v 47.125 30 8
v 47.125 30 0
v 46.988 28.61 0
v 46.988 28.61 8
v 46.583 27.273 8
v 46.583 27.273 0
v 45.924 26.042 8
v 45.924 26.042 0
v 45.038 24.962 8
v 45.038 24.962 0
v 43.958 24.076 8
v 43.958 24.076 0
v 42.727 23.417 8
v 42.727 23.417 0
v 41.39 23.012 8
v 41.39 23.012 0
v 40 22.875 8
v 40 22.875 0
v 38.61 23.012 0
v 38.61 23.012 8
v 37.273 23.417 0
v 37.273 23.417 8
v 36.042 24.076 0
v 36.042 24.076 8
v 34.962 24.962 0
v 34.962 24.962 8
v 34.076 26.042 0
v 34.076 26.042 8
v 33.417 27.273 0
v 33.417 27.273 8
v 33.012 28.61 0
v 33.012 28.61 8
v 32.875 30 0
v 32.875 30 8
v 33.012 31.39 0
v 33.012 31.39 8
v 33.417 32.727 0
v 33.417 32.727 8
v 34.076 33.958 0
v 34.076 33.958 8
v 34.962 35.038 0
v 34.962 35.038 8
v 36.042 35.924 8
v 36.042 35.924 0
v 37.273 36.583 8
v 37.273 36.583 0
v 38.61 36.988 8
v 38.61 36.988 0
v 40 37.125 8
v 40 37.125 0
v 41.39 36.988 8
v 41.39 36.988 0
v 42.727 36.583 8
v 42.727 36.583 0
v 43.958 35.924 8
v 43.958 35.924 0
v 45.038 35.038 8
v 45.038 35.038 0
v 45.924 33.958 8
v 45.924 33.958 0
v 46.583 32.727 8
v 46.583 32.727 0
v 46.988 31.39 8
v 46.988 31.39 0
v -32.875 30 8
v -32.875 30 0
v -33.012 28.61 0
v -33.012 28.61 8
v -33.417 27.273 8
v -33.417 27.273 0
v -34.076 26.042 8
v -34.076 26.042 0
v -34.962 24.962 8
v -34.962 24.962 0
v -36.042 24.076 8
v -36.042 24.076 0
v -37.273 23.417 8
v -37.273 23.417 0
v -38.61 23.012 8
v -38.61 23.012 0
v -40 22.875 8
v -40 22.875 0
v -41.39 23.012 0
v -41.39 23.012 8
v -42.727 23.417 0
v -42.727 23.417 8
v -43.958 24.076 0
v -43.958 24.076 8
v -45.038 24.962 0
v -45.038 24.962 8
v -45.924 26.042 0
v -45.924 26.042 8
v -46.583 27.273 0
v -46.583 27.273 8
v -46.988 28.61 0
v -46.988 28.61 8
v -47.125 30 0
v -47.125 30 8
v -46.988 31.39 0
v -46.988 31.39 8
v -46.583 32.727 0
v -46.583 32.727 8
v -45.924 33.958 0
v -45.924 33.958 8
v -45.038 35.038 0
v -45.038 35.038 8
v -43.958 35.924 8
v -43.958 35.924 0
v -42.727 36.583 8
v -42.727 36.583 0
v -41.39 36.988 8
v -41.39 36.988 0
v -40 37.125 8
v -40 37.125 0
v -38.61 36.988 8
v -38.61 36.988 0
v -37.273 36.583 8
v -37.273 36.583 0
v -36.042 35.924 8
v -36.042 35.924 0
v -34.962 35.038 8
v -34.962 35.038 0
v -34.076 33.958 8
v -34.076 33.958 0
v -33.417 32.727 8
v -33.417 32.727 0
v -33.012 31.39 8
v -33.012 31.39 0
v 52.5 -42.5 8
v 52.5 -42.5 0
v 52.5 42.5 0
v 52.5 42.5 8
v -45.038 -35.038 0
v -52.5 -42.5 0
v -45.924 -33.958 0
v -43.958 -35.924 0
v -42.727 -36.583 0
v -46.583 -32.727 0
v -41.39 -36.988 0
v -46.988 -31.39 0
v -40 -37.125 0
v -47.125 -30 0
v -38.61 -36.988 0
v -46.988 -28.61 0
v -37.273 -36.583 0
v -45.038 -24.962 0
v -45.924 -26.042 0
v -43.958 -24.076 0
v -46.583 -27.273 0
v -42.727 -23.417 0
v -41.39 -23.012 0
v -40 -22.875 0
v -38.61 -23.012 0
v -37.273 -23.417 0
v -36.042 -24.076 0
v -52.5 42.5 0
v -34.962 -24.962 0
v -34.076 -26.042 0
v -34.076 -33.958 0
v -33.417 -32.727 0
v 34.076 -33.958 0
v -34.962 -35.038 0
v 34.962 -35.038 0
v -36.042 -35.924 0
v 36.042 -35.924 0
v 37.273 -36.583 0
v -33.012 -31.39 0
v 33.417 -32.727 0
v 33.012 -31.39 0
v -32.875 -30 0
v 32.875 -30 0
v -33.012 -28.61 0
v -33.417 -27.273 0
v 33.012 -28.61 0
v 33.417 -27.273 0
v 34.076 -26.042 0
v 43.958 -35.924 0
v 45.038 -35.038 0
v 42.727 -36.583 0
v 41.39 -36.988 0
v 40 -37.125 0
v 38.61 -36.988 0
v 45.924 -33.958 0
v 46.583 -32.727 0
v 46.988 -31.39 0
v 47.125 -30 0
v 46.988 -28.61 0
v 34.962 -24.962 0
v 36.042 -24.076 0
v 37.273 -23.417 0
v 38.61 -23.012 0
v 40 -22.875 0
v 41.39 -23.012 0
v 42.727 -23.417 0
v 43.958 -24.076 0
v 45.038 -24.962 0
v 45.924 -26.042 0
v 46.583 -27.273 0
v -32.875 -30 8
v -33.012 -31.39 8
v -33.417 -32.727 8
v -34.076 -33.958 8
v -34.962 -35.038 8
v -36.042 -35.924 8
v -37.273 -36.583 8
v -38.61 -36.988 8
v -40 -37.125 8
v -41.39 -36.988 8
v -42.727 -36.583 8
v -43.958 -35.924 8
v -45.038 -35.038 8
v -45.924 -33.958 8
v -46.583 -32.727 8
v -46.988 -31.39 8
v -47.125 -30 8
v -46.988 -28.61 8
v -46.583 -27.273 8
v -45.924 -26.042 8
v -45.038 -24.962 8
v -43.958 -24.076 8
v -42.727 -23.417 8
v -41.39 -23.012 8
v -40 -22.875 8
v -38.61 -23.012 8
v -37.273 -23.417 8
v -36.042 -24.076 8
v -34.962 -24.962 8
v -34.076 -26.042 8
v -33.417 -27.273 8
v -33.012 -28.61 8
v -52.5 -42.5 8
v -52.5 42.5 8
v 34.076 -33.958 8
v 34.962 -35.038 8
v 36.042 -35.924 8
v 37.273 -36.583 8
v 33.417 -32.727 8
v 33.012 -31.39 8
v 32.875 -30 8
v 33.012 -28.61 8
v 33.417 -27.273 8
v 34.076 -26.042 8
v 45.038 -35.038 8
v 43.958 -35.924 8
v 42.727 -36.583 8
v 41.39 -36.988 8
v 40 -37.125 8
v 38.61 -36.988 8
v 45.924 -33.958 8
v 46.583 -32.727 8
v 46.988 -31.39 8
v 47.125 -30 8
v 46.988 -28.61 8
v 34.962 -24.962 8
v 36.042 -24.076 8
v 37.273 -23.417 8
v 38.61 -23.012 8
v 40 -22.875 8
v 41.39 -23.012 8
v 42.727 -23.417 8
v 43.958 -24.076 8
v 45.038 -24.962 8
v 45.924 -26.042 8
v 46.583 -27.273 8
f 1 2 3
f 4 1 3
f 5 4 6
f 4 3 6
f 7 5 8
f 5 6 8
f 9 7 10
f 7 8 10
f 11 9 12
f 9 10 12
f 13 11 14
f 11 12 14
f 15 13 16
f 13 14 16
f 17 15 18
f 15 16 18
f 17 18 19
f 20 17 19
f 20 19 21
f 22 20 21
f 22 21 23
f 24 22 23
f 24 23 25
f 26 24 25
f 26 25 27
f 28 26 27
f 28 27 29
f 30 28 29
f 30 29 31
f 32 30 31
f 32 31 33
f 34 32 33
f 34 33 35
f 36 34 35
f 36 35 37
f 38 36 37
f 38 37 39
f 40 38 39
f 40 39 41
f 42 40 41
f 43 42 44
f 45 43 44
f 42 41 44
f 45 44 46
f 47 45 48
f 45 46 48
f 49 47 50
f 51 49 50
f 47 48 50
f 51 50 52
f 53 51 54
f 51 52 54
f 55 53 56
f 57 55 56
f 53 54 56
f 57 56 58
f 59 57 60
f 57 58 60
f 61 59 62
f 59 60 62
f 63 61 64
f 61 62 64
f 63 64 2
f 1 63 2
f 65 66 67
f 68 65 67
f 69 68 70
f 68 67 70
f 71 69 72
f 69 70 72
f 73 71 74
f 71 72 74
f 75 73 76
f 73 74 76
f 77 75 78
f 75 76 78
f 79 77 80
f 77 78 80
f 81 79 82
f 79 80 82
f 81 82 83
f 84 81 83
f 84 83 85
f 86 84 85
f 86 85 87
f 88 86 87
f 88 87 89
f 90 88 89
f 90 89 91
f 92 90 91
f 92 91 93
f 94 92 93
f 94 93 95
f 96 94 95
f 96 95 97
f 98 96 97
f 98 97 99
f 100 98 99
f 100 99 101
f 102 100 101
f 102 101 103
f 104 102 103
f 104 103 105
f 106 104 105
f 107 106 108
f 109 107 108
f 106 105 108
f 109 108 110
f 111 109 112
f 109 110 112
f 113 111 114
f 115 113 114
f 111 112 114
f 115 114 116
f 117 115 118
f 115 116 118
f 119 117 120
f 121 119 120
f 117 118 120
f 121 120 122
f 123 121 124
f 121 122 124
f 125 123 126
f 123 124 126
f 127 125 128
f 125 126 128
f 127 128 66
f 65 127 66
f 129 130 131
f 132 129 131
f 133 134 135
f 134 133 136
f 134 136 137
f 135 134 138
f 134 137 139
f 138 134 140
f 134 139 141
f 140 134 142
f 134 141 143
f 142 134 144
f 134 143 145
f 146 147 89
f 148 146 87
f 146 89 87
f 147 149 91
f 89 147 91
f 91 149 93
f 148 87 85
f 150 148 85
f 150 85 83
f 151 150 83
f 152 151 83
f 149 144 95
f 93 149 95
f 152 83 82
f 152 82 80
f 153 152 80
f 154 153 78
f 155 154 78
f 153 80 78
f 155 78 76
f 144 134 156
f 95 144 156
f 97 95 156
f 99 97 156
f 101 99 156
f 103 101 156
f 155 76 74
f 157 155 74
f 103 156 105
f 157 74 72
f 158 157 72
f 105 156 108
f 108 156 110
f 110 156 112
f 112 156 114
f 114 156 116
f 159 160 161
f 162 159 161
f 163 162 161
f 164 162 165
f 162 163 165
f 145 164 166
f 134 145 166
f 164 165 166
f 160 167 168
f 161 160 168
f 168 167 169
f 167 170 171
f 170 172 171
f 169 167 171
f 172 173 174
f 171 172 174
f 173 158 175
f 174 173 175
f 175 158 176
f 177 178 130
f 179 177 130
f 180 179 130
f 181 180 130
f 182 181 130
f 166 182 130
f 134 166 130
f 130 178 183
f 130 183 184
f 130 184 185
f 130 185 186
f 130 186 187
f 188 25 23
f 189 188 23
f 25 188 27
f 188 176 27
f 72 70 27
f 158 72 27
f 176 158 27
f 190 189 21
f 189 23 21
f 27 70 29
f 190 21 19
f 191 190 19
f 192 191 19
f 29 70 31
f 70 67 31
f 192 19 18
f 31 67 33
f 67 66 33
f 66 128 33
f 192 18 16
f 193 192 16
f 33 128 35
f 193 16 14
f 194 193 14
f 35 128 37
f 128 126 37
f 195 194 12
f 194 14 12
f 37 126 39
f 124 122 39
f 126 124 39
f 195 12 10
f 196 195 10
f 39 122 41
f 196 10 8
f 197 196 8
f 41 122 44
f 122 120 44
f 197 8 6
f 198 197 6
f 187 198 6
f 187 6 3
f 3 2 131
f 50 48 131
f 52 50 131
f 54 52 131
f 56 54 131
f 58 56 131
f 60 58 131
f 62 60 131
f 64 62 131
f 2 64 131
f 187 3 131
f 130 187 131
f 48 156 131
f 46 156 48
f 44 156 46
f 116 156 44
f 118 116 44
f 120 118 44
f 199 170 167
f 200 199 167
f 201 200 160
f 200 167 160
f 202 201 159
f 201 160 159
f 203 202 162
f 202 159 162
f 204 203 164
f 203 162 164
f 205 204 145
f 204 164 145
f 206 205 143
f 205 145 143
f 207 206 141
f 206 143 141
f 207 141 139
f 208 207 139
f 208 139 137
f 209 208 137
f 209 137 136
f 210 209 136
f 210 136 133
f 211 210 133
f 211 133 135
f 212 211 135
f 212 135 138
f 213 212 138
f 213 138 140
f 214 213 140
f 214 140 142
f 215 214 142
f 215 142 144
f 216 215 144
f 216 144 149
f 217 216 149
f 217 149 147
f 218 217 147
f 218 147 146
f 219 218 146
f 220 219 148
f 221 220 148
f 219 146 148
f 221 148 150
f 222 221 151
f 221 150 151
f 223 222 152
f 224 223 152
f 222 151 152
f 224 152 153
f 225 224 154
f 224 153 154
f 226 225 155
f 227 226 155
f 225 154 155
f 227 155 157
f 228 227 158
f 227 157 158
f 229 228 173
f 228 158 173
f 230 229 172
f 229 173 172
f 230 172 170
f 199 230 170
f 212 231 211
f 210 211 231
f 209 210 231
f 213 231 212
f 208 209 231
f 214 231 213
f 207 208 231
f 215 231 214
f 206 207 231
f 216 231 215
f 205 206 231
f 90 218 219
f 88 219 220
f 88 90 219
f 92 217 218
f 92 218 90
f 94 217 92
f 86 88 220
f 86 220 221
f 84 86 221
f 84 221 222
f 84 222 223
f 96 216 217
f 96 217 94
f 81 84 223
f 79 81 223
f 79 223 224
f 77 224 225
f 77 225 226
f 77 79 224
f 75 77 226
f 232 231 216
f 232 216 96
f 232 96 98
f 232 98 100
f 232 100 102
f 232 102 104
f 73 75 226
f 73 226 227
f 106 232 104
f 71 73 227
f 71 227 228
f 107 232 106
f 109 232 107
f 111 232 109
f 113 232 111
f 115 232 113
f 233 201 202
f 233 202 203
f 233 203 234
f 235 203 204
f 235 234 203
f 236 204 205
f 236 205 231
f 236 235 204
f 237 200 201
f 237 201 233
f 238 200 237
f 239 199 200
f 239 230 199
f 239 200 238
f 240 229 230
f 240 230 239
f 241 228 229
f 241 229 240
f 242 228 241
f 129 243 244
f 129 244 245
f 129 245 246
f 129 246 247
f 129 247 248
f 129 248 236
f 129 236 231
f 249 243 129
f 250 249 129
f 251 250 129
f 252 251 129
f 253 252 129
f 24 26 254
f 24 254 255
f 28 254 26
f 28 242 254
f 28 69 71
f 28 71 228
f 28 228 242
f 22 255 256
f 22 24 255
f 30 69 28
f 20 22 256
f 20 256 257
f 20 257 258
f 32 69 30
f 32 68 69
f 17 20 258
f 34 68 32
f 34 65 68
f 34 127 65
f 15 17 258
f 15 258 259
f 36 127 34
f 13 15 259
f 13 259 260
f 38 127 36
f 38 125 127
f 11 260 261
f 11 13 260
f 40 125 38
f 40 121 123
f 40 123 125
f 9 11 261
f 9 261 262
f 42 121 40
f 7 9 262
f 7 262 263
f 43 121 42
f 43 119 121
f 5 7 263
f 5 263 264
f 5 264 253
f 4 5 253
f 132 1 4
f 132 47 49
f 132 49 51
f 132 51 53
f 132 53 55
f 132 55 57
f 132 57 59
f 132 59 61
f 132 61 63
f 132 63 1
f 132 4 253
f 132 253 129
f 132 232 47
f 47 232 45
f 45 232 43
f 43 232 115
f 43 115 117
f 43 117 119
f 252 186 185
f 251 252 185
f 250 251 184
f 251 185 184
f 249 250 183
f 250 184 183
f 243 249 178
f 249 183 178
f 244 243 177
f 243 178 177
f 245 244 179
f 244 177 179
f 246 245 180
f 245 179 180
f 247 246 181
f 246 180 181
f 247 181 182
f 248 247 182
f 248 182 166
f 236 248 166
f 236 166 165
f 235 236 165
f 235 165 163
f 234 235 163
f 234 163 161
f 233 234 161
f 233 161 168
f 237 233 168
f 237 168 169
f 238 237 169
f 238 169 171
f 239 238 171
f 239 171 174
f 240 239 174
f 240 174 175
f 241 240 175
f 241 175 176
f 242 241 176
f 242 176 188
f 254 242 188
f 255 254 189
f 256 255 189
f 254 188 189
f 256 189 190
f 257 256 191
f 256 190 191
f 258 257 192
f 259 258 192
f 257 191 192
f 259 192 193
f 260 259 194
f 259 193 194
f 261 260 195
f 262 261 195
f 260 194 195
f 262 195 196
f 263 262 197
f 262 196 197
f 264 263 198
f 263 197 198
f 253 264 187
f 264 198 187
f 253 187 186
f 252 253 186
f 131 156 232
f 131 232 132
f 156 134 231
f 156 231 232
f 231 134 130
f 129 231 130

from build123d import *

# Parameters (mm, degrees)
F0_W           = 105
F0_H           = 85
F0_R           = 4
F1_DEPTH       = 8
F2_D           = 8.8
F2_CBORE_D     = 14.25
F2_CBORE_DEPTH = 8


with BuildPart() as f1:
    # F0 (on Top) → F1 (new body)
    with BuildSketch(Plane.XY):
        Rectangle(F0_W, F0_H)
        with Locations((-40, -30)):
            Circle(F0_R, mode=Mode.SUBTRACT)
        with Locations((40, -30)):
            Circle(F0_R, mode=Mode.SUBTRACT)
        with Locations((-40, 30)):
            Circle(F0_R, mode=Mode.SUBTRACT)
        with Locations((40, 30)):
            Circle(F0_R, mode=Mode.SUBTRACT)
        with Locations((-40, 30)):
            Circle(F0_R)
        with Locations((40, 30)):
            Circle(F0_R)
        with Locations((40, -30)):
            Circle(F0_R)
        with Locations((-40, -30)):
            Circle(F0_R)
    extrude(amount=F1_DEPTH)

    # F2 (through all)
    with Locations(Plane(origin=(0, 0, 0), x_dir=(1, 0, 0), z_dir=(0, 0, -1))):
        with Locations((-40, -30), (40, -30), (40, 30), (-40, 30)):
            CounterBoreHole(F2_D / 2, F2_CBORE_D / 2, F2_CBORE_DEPTH)


solid = f1.part
